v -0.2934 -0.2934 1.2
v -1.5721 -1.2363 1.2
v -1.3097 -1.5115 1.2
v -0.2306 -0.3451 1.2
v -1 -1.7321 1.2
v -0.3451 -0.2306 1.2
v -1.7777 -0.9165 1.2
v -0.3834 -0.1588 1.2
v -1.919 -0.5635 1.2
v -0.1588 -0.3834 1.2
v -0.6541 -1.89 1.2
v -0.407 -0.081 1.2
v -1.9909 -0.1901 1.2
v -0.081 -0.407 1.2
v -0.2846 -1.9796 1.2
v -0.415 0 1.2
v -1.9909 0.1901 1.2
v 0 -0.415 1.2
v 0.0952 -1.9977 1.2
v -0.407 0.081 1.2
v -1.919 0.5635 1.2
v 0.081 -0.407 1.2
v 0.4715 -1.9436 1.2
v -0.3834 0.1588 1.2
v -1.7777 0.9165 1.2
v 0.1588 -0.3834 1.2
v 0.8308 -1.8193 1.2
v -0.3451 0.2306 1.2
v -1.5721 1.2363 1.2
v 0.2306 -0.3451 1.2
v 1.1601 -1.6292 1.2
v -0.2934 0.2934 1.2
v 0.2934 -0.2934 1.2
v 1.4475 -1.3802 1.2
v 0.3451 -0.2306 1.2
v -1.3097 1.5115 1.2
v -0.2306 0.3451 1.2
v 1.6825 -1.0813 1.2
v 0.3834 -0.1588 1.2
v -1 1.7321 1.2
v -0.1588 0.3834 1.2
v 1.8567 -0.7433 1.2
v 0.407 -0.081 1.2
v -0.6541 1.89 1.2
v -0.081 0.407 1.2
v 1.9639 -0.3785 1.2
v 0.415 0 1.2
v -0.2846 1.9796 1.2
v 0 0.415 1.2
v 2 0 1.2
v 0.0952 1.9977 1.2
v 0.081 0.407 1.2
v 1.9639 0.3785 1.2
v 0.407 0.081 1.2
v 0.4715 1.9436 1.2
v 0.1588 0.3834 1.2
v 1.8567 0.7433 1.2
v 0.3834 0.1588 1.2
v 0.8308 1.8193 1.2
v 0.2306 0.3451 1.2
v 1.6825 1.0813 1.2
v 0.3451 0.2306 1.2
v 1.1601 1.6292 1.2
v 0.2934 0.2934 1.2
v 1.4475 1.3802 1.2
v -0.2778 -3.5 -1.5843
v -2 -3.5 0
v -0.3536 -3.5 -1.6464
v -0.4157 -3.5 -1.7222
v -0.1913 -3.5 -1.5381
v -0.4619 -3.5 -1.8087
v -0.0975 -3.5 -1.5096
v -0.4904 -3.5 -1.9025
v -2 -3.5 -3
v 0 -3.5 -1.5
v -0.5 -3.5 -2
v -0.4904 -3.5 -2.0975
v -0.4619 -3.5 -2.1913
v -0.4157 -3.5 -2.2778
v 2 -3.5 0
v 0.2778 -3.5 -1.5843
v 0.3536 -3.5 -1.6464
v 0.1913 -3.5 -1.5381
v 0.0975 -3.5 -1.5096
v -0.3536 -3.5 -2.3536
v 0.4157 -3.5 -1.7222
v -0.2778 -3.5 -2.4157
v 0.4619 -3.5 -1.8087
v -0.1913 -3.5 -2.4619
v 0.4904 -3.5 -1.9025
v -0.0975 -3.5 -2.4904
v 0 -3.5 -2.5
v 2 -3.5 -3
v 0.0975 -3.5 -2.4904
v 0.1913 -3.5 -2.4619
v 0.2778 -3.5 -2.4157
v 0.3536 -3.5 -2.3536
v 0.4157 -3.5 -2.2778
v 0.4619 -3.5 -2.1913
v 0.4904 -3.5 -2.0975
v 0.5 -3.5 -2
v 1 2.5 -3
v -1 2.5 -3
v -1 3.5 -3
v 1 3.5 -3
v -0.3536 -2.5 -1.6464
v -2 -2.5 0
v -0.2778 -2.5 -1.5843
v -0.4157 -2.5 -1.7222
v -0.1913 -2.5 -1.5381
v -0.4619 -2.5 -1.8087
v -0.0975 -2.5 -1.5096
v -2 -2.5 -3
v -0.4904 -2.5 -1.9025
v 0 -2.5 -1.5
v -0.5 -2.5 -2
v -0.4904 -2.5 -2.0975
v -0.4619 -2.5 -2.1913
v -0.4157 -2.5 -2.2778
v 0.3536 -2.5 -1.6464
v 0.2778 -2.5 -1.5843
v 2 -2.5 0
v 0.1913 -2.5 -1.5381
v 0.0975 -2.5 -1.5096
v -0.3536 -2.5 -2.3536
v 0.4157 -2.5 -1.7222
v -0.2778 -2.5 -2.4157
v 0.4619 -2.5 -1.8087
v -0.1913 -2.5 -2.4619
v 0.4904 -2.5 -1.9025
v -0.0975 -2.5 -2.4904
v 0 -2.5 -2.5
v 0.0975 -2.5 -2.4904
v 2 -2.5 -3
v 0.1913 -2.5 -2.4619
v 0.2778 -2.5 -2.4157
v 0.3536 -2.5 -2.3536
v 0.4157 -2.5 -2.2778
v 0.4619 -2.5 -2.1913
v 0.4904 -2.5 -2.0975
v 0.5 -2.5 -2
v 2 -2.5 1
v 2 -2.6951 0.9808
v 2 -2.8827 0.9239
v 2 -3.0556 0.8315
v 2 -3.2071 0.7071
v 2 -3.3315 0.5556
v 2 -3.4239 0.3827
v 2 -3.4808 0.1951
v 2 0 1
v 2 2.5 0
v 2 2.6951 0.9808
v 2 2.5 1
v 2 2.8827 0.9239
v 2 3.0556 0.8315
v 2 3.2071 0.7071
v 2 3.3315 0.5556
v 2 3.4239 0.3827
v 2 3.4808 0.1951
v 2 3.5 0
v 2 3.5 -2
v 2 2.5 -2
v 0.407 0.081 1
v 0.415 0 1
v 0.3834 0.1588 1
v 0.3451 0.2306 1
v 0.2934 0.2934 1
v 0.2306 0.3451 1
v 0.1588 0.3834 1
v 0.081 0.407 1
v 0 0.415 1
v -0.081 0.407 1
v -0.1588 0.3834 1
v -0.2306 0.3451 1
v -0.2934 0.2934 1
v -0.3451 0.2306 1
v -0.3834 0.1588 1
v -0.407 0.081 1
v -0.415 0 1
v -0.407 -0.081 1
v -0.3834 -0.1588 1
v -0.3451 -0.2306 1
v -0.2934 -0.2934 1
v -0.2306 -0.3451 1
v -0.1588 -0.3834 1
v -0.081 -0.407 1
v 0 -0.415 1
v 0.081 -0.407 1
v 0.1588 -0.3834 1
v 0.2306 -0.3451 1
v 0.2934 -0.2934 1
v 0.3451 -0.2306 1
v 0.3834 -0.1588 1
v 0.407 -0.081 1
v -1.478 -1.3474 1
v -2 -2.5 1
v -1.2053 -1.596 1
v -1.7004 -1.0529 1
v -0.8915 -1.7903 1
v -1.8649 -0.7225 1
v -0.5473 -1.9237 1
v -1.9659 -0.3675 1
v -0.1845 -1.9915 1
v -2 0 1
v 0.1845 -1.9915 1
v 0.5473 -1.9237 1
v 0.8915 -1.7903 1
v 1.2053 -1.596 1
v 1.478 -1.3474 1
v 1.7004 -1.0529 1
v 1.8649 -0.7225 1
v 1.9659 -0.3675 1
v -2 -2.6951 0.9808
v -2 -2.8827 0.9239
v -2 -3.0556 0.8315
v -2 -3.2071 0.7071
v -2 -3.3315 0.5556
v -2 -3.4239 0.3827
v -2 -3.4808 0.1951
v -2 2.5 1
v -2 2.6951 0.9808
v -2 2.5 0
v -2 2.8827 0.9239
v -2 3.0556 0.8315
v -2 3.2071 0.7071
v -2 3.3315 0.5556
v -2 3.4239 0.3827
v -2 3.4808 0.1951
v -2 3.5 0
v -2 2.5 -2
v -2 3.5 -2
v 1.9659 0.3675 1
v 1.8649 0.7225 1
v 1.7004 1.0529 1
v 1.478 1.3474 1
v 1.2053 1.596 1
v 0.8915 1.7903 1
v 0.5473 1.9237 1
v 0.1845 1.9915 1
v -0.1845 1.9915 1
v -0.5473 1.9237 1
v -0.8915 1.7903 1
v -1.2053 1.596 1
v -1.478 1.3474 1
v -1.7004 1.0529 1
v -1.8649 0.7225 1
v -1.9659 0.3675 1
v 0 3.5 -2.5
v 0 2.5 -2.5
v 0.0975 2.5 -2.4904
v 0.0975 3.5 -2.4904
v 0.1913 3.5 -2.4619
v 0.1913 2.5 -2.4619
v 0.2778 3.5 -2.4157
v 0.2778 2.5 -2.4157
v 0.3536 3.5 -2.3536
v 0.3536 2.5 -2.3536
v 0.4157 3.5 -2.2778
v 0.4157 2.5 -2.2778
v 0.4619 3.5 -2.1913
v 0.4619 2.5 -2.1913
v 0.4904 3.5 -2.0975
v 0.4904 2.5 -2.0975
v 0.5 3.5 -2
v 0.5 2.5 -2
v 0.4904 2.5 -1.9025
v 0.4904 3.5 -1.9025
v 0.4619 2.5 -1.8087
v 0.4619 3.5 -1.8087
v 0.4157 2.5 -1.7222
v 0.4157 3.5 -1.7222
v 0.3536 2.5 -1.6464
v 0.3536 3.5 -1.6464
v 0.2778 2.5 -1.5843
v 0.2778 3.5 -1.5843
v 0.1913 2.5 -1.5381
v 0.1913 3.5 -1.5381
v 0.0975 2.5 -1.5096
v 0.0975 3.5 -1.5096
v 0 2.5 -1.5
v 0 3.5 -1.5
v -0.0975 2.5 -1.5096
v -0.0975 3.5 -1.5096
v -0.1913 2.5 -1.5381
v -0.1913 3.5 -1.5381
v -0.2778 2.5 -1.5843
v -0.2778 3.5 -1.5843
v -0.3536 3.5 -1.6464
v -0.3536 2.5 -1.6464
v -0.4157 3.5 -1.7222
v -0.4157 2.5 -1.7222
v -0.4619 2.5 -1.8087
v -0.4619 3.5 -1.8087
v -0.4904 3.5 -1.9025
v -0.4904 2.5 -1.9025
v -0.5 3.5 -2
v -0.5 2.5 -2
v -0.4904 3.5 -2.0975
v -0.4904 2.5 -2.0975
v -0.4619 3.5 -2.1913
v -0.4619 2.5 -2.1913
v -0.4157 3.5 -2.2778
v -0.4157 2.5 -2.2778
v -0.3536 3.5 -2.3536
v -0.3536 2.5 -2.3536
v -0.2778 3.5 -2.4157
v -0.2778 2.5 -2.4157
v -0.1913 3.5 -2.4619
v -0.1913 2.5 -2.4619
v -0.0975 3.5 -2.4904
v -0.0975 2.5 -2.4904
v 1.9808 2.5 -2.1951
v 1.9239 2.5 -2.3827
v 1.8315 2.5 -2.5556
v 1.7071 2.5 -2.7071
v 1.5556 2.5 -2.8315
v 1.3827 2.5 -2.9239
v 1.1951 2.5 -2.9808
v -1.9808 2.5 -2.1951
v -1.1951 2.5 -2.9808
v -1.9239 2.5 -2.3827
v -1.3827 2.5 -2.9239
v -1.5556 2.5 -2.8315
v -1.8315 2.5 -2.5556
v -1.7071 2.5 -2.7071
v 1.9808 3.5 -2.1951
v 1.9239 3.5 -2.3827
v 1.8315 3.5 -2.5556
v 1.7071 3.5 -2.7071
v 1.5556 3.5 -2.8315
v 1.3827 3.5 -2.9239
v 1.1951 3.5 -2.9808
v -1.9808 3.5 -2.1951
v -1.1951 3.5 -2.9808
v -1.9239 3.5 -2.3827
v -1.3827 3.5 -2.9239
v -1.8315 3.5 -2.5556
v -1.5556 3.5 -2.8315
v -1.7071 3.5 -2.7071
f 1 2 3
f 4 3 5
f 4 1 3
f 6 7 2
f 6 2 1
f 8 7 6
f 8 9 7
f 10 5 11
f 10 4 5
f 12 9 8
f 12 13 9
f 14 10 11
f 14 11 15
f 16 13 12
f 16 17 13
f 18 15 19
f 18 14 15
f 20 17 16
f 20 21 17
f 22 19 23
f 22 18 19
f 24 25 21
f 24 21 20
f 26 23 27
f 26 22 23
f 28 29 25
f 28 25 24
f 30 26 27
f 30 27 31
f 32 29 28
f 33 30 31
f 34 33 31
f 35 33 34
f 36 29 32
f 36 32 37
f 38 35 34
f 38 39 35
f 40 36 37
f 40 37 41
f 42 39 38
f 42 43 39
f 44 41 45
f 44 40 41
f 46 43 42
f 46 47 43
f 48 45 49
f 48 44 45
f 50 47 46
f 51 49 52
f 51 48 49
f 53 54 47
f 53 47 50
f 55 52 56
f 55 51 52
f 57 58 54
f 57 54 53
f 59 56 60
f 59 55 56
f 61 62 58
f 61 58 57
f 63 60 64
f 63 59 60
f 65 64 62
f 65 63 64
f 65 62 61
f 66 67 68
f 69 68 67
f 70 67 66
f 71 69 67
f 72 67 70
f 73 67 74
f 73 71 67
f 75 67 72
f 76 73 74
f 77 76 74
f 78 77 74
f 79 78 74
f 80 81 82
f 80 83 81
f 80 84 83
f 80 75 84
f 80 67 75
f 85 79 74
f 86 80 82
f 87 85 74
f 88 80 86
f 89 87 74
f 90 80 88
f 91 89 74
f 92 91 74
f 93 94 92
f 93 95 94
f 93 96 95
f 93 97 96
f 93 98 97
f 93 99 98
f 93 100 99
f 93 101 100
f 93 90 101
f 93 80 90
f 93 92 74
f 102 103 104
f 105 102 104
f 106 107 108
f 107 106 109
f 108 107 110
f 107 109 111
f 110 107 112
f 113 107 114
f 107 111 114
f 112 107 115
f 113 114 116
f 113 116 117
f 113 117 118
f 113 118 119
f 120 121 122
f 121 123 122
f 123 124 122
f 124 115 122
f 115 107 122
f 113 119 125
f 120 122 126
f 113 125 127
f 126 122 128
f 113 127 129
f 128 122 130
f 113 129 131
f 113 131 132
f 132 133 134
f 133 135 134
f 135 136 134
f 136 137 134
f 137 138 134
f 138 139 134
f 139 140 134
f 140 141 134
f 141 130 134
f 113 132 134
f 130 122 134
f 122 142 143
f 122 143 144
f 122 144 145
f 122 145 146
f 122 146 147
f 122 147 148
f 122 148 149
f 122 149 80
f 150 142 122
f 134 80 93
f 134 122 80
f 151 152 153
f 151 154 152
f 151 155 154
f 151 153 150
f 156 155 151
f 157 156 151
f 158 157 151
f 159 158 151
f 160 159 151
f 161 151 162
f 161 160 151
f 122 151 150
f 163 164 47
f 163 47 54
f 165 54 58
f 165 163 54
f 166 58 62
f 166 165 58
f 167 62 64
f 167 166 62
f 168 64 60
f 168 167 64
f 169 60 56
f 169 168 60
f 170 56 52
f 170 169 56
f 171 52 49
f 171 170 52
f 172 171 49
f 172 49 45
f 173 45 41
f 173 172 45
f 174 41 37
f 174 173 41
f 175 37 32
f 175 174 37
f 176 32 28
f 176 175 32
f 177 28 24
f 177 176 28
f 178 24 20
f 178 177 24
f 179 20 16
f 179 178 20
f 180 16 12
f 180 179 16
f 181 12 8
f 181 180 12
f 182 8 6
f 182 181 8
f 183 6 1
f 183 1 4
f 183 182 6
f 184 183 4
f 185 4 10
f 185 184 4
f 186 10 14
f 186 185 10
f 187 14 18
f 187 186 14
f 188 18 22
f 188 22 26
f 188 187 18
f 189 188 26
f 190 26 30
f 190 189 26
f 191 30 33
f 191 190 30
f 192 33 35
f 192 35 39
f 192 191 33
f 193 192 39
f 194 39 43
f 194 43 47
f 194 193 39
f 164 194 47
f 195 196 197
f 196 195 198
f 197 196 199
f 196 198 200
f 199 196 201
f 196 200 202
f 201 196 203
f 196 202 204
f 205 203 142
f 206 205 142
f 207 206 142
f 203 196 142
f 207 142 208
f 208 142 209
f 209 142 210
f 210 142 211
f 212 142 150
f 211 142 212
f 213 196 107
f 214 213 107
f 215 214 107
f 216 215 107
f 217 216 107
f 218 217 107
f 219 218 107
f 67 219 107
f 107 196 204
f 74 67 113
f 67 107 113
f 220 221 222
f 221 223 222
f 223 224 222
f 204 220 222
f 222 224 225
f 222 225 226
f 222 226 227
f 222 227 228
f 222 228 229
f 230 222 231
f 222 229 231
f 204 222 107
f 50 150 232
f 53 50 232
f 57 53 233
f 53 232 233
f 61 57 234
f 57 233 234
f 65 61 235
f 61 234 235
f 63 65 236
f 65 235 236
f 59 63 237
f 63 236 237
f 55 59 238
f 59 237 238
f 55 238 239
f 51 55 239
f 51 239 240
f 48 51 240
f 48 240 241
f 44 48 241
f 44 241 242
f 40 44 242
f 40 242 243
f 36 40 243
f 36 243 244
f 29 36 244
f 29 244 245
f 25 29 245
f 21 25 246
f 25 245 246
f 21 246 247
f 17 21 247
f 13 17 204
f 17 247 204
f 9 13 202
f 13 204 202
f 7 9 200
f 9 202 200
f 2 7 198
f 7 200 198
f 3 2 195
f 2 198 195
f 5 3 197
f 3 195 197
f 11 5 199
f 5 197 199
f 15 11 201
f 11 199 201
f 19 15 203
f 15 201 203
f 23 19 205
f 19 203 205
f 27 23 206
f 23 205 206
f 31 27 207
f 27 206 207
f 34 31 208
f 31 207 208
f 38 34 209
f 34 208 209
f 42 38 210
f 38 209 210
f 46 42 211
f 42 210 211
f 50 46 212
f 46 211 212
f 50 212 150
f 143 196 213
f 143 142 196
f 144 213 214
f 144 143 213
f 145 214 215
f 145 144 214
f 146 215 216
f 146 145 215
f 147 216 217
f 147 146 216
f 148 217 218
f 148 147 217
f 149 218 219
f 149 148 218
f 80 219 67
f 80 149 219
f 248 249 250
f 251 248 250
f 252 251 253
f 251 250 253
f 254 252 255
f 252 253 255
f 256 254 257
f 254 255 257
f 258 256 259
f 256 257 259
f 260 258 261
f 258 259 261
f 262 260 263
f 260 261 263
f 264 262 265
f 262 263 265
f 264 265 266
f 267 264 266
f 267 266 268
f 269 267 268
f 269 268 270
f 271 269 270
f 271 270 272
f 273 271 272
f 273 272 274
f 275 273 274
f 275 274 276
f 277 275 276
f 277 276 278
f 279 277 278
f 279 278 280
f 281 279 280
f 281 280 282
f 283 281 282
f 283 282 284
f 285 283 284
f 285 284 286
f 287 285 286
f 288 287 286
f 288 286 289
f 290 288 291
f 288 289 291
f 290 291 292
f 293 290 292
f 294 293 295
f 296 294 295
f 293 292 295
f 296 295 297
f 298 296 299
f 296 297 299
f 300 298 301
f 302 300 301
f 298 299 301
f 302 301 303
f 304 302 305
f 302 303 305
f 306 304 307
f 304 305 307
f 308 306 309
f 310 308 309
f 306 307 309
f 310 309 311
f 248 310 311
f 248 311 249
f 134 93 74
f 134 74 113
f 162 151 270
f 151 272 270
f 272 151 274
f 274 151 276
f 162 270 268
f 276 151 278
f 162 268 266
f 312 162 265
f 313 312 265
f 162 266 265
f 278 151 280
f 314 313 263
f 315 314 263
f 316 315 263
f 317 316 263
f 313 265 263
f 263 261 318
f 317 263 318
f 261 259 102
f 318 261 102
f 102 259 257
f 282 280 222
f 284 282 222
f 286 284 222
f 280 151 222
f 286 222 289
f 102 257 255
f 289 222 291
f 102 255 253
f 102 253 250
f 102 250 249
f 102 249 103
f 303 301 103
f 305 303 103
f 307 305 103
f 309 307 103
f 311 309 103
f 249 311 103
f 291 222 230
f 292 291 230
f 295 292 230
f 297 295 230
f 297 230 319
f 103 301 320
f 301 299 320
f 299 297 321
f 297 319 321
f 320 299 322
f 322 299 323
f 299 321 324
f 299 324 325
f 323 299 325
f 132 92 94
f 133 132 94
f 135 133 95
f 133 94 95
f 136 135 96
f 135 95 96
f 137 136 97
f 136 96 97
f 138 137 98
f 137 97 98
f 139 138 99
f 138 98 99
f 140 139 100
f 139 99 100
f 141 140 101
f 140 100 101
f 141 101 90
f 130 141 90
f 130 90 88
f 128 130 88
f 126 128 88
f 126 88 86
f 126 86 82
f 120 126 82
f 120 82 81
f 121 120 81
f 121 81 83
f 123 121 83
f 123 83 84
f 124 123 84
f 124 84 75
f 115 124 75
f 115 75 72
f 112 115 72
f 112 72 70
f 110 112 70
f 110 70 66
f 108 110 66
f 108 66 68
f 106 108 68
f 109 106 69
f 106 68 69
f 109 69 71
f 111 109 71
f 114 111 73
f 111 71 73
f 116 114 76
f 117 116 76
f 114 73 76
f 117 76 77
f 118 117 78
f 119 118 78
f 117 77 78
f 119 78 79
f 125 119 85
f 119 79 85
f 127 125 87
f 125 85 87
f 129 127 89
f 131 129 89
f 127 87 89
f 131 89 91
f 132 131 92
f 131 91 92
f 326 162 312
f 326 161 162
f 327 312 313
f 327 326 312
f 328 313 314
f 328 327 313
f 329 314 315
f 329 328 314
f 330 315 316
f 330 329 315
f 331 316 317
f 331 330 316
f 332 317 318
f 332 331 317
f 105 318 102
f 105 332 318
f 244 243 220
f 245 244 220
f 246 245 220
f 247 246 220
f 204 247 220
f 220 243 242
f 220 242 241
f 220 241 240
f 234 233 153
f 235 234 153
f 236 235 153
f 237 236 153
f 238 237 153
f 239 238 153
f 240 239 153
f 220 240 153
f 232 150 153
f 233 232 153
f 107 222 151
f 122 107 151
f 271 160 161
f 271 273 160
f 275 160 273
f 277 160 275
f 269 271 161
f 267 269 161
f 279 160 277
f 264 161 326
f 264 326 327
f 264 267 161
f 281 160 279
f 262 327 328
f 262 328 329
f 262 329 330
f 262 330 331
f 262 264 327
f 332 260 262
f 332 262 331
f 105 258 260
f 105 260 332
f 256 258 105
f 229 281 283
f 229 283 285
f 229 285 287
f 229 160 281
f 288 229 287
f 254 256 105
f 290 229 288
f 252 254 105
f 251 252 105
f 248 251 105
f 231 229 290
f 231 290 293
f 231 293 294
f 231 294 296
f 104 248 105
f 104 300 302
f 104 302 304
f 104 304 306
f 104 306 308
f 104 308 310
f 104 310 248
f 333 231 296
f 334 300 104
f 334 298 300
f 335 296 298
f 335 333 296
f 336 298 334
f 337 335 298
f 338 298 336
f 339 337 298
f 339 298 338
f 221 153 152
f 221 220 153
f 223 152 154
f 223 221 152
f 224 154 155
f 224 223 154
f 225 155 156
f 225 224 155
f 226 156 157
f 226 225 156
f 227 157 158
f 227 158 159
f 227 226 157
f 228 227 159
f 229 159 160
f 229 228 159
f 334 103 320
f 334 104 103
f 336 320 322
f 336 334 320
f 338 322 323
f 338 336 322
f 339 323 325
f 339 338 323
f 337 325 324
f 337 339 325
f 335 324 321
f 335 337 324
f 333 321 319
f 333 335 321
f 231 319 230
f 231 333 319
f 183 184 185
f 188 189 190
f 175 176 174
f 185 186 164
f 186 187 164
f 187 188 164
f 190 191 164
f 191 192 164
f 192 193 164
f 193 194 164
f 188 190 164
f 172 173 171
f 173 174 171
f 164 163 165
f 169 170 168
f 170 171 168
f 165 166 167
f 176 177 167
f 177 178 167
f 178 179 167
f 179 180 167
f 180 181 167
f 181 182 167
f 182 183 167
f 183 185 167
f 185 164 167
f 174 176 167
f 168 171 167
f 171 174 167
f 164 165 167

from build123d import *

# Parameters (mm, degrees)
SKETCH1_W           = 4
SKETCH1_H           = 5
BOSS_EXTRUDE1_DEPTH = 1
SKETCH2_W           = 4
SKETCH2_H           = 1
BOSS_EXTRUDE2_DEPTH = 2
FILLET1_R           = 1
SKETCH3_R           = 2
SKETCH3_R_2         = 0.415
BOSS_EXTRUDE3_DEPTH = 0.2
SKETCH4_R           = 0.5
CUT_EXTRUDE1_DEPTH  = 8.874007874


with BuildPart() as part:
    # Sketch1 → Boss-Extrude1 (new body)
    with BuildSketch(Plane.XY):
        Rectangle(SKETCH1_W, SKETCH1_H)
    extrude(amount=BOSS_EXTRUDE1_DEPTH)

    # Sketch2 → Boss-Extrude2 (add, symmetric)
    with BuildSketch(Plane(origin=(0, 0, 0), x_dir=(0, 0, -1), z_dir=(1, 0, 0))):
        with Locations((1, 3)):
            Rectangle(SKETCH2_W, SKETCH2_H)
        with Locations((1, -3)):
            Rectangle(SKETCH2_W, SKETCH2_H)
    extrude(amount=BOSS_EXTRUDE2_DEPTH, both=True)

    # Fillet1
    fillet1_edges = [part.edges().sort_by_distance(p)[0] for p in [
        (0, 3.5, 1),
        (-2, 3, -3),
        (2, 3, -3),
        (0, -3.5, 1),
    ]]
    fillet(fillet1_edges, radius=FILLET1_R)

    # Sketch3 → Boss-Extrude3 (add)
    with BuildSketch(Plane.XY.offset(1)):
        Circle(SKETCH3_R)
        Circle(SKETCH3_R_2, mode=Mode.SUBTRACT)
    extrude(amount=BOSS_EXTRUDE3_DEPTH)

    # Sketch4 → Cut-Extrude1 (cut, through all)
    with BuildSketch(Plane.XZ.offset(3.5)):
        with Locations(Location((0, -2, 0), (0, 0, 270))):
            Circle(SKETCH4_R)
    extrude(amount=-CUT_EXTRUDE1_DEPTH, mode=Mode.SUBTRACT)


solid = part.part
